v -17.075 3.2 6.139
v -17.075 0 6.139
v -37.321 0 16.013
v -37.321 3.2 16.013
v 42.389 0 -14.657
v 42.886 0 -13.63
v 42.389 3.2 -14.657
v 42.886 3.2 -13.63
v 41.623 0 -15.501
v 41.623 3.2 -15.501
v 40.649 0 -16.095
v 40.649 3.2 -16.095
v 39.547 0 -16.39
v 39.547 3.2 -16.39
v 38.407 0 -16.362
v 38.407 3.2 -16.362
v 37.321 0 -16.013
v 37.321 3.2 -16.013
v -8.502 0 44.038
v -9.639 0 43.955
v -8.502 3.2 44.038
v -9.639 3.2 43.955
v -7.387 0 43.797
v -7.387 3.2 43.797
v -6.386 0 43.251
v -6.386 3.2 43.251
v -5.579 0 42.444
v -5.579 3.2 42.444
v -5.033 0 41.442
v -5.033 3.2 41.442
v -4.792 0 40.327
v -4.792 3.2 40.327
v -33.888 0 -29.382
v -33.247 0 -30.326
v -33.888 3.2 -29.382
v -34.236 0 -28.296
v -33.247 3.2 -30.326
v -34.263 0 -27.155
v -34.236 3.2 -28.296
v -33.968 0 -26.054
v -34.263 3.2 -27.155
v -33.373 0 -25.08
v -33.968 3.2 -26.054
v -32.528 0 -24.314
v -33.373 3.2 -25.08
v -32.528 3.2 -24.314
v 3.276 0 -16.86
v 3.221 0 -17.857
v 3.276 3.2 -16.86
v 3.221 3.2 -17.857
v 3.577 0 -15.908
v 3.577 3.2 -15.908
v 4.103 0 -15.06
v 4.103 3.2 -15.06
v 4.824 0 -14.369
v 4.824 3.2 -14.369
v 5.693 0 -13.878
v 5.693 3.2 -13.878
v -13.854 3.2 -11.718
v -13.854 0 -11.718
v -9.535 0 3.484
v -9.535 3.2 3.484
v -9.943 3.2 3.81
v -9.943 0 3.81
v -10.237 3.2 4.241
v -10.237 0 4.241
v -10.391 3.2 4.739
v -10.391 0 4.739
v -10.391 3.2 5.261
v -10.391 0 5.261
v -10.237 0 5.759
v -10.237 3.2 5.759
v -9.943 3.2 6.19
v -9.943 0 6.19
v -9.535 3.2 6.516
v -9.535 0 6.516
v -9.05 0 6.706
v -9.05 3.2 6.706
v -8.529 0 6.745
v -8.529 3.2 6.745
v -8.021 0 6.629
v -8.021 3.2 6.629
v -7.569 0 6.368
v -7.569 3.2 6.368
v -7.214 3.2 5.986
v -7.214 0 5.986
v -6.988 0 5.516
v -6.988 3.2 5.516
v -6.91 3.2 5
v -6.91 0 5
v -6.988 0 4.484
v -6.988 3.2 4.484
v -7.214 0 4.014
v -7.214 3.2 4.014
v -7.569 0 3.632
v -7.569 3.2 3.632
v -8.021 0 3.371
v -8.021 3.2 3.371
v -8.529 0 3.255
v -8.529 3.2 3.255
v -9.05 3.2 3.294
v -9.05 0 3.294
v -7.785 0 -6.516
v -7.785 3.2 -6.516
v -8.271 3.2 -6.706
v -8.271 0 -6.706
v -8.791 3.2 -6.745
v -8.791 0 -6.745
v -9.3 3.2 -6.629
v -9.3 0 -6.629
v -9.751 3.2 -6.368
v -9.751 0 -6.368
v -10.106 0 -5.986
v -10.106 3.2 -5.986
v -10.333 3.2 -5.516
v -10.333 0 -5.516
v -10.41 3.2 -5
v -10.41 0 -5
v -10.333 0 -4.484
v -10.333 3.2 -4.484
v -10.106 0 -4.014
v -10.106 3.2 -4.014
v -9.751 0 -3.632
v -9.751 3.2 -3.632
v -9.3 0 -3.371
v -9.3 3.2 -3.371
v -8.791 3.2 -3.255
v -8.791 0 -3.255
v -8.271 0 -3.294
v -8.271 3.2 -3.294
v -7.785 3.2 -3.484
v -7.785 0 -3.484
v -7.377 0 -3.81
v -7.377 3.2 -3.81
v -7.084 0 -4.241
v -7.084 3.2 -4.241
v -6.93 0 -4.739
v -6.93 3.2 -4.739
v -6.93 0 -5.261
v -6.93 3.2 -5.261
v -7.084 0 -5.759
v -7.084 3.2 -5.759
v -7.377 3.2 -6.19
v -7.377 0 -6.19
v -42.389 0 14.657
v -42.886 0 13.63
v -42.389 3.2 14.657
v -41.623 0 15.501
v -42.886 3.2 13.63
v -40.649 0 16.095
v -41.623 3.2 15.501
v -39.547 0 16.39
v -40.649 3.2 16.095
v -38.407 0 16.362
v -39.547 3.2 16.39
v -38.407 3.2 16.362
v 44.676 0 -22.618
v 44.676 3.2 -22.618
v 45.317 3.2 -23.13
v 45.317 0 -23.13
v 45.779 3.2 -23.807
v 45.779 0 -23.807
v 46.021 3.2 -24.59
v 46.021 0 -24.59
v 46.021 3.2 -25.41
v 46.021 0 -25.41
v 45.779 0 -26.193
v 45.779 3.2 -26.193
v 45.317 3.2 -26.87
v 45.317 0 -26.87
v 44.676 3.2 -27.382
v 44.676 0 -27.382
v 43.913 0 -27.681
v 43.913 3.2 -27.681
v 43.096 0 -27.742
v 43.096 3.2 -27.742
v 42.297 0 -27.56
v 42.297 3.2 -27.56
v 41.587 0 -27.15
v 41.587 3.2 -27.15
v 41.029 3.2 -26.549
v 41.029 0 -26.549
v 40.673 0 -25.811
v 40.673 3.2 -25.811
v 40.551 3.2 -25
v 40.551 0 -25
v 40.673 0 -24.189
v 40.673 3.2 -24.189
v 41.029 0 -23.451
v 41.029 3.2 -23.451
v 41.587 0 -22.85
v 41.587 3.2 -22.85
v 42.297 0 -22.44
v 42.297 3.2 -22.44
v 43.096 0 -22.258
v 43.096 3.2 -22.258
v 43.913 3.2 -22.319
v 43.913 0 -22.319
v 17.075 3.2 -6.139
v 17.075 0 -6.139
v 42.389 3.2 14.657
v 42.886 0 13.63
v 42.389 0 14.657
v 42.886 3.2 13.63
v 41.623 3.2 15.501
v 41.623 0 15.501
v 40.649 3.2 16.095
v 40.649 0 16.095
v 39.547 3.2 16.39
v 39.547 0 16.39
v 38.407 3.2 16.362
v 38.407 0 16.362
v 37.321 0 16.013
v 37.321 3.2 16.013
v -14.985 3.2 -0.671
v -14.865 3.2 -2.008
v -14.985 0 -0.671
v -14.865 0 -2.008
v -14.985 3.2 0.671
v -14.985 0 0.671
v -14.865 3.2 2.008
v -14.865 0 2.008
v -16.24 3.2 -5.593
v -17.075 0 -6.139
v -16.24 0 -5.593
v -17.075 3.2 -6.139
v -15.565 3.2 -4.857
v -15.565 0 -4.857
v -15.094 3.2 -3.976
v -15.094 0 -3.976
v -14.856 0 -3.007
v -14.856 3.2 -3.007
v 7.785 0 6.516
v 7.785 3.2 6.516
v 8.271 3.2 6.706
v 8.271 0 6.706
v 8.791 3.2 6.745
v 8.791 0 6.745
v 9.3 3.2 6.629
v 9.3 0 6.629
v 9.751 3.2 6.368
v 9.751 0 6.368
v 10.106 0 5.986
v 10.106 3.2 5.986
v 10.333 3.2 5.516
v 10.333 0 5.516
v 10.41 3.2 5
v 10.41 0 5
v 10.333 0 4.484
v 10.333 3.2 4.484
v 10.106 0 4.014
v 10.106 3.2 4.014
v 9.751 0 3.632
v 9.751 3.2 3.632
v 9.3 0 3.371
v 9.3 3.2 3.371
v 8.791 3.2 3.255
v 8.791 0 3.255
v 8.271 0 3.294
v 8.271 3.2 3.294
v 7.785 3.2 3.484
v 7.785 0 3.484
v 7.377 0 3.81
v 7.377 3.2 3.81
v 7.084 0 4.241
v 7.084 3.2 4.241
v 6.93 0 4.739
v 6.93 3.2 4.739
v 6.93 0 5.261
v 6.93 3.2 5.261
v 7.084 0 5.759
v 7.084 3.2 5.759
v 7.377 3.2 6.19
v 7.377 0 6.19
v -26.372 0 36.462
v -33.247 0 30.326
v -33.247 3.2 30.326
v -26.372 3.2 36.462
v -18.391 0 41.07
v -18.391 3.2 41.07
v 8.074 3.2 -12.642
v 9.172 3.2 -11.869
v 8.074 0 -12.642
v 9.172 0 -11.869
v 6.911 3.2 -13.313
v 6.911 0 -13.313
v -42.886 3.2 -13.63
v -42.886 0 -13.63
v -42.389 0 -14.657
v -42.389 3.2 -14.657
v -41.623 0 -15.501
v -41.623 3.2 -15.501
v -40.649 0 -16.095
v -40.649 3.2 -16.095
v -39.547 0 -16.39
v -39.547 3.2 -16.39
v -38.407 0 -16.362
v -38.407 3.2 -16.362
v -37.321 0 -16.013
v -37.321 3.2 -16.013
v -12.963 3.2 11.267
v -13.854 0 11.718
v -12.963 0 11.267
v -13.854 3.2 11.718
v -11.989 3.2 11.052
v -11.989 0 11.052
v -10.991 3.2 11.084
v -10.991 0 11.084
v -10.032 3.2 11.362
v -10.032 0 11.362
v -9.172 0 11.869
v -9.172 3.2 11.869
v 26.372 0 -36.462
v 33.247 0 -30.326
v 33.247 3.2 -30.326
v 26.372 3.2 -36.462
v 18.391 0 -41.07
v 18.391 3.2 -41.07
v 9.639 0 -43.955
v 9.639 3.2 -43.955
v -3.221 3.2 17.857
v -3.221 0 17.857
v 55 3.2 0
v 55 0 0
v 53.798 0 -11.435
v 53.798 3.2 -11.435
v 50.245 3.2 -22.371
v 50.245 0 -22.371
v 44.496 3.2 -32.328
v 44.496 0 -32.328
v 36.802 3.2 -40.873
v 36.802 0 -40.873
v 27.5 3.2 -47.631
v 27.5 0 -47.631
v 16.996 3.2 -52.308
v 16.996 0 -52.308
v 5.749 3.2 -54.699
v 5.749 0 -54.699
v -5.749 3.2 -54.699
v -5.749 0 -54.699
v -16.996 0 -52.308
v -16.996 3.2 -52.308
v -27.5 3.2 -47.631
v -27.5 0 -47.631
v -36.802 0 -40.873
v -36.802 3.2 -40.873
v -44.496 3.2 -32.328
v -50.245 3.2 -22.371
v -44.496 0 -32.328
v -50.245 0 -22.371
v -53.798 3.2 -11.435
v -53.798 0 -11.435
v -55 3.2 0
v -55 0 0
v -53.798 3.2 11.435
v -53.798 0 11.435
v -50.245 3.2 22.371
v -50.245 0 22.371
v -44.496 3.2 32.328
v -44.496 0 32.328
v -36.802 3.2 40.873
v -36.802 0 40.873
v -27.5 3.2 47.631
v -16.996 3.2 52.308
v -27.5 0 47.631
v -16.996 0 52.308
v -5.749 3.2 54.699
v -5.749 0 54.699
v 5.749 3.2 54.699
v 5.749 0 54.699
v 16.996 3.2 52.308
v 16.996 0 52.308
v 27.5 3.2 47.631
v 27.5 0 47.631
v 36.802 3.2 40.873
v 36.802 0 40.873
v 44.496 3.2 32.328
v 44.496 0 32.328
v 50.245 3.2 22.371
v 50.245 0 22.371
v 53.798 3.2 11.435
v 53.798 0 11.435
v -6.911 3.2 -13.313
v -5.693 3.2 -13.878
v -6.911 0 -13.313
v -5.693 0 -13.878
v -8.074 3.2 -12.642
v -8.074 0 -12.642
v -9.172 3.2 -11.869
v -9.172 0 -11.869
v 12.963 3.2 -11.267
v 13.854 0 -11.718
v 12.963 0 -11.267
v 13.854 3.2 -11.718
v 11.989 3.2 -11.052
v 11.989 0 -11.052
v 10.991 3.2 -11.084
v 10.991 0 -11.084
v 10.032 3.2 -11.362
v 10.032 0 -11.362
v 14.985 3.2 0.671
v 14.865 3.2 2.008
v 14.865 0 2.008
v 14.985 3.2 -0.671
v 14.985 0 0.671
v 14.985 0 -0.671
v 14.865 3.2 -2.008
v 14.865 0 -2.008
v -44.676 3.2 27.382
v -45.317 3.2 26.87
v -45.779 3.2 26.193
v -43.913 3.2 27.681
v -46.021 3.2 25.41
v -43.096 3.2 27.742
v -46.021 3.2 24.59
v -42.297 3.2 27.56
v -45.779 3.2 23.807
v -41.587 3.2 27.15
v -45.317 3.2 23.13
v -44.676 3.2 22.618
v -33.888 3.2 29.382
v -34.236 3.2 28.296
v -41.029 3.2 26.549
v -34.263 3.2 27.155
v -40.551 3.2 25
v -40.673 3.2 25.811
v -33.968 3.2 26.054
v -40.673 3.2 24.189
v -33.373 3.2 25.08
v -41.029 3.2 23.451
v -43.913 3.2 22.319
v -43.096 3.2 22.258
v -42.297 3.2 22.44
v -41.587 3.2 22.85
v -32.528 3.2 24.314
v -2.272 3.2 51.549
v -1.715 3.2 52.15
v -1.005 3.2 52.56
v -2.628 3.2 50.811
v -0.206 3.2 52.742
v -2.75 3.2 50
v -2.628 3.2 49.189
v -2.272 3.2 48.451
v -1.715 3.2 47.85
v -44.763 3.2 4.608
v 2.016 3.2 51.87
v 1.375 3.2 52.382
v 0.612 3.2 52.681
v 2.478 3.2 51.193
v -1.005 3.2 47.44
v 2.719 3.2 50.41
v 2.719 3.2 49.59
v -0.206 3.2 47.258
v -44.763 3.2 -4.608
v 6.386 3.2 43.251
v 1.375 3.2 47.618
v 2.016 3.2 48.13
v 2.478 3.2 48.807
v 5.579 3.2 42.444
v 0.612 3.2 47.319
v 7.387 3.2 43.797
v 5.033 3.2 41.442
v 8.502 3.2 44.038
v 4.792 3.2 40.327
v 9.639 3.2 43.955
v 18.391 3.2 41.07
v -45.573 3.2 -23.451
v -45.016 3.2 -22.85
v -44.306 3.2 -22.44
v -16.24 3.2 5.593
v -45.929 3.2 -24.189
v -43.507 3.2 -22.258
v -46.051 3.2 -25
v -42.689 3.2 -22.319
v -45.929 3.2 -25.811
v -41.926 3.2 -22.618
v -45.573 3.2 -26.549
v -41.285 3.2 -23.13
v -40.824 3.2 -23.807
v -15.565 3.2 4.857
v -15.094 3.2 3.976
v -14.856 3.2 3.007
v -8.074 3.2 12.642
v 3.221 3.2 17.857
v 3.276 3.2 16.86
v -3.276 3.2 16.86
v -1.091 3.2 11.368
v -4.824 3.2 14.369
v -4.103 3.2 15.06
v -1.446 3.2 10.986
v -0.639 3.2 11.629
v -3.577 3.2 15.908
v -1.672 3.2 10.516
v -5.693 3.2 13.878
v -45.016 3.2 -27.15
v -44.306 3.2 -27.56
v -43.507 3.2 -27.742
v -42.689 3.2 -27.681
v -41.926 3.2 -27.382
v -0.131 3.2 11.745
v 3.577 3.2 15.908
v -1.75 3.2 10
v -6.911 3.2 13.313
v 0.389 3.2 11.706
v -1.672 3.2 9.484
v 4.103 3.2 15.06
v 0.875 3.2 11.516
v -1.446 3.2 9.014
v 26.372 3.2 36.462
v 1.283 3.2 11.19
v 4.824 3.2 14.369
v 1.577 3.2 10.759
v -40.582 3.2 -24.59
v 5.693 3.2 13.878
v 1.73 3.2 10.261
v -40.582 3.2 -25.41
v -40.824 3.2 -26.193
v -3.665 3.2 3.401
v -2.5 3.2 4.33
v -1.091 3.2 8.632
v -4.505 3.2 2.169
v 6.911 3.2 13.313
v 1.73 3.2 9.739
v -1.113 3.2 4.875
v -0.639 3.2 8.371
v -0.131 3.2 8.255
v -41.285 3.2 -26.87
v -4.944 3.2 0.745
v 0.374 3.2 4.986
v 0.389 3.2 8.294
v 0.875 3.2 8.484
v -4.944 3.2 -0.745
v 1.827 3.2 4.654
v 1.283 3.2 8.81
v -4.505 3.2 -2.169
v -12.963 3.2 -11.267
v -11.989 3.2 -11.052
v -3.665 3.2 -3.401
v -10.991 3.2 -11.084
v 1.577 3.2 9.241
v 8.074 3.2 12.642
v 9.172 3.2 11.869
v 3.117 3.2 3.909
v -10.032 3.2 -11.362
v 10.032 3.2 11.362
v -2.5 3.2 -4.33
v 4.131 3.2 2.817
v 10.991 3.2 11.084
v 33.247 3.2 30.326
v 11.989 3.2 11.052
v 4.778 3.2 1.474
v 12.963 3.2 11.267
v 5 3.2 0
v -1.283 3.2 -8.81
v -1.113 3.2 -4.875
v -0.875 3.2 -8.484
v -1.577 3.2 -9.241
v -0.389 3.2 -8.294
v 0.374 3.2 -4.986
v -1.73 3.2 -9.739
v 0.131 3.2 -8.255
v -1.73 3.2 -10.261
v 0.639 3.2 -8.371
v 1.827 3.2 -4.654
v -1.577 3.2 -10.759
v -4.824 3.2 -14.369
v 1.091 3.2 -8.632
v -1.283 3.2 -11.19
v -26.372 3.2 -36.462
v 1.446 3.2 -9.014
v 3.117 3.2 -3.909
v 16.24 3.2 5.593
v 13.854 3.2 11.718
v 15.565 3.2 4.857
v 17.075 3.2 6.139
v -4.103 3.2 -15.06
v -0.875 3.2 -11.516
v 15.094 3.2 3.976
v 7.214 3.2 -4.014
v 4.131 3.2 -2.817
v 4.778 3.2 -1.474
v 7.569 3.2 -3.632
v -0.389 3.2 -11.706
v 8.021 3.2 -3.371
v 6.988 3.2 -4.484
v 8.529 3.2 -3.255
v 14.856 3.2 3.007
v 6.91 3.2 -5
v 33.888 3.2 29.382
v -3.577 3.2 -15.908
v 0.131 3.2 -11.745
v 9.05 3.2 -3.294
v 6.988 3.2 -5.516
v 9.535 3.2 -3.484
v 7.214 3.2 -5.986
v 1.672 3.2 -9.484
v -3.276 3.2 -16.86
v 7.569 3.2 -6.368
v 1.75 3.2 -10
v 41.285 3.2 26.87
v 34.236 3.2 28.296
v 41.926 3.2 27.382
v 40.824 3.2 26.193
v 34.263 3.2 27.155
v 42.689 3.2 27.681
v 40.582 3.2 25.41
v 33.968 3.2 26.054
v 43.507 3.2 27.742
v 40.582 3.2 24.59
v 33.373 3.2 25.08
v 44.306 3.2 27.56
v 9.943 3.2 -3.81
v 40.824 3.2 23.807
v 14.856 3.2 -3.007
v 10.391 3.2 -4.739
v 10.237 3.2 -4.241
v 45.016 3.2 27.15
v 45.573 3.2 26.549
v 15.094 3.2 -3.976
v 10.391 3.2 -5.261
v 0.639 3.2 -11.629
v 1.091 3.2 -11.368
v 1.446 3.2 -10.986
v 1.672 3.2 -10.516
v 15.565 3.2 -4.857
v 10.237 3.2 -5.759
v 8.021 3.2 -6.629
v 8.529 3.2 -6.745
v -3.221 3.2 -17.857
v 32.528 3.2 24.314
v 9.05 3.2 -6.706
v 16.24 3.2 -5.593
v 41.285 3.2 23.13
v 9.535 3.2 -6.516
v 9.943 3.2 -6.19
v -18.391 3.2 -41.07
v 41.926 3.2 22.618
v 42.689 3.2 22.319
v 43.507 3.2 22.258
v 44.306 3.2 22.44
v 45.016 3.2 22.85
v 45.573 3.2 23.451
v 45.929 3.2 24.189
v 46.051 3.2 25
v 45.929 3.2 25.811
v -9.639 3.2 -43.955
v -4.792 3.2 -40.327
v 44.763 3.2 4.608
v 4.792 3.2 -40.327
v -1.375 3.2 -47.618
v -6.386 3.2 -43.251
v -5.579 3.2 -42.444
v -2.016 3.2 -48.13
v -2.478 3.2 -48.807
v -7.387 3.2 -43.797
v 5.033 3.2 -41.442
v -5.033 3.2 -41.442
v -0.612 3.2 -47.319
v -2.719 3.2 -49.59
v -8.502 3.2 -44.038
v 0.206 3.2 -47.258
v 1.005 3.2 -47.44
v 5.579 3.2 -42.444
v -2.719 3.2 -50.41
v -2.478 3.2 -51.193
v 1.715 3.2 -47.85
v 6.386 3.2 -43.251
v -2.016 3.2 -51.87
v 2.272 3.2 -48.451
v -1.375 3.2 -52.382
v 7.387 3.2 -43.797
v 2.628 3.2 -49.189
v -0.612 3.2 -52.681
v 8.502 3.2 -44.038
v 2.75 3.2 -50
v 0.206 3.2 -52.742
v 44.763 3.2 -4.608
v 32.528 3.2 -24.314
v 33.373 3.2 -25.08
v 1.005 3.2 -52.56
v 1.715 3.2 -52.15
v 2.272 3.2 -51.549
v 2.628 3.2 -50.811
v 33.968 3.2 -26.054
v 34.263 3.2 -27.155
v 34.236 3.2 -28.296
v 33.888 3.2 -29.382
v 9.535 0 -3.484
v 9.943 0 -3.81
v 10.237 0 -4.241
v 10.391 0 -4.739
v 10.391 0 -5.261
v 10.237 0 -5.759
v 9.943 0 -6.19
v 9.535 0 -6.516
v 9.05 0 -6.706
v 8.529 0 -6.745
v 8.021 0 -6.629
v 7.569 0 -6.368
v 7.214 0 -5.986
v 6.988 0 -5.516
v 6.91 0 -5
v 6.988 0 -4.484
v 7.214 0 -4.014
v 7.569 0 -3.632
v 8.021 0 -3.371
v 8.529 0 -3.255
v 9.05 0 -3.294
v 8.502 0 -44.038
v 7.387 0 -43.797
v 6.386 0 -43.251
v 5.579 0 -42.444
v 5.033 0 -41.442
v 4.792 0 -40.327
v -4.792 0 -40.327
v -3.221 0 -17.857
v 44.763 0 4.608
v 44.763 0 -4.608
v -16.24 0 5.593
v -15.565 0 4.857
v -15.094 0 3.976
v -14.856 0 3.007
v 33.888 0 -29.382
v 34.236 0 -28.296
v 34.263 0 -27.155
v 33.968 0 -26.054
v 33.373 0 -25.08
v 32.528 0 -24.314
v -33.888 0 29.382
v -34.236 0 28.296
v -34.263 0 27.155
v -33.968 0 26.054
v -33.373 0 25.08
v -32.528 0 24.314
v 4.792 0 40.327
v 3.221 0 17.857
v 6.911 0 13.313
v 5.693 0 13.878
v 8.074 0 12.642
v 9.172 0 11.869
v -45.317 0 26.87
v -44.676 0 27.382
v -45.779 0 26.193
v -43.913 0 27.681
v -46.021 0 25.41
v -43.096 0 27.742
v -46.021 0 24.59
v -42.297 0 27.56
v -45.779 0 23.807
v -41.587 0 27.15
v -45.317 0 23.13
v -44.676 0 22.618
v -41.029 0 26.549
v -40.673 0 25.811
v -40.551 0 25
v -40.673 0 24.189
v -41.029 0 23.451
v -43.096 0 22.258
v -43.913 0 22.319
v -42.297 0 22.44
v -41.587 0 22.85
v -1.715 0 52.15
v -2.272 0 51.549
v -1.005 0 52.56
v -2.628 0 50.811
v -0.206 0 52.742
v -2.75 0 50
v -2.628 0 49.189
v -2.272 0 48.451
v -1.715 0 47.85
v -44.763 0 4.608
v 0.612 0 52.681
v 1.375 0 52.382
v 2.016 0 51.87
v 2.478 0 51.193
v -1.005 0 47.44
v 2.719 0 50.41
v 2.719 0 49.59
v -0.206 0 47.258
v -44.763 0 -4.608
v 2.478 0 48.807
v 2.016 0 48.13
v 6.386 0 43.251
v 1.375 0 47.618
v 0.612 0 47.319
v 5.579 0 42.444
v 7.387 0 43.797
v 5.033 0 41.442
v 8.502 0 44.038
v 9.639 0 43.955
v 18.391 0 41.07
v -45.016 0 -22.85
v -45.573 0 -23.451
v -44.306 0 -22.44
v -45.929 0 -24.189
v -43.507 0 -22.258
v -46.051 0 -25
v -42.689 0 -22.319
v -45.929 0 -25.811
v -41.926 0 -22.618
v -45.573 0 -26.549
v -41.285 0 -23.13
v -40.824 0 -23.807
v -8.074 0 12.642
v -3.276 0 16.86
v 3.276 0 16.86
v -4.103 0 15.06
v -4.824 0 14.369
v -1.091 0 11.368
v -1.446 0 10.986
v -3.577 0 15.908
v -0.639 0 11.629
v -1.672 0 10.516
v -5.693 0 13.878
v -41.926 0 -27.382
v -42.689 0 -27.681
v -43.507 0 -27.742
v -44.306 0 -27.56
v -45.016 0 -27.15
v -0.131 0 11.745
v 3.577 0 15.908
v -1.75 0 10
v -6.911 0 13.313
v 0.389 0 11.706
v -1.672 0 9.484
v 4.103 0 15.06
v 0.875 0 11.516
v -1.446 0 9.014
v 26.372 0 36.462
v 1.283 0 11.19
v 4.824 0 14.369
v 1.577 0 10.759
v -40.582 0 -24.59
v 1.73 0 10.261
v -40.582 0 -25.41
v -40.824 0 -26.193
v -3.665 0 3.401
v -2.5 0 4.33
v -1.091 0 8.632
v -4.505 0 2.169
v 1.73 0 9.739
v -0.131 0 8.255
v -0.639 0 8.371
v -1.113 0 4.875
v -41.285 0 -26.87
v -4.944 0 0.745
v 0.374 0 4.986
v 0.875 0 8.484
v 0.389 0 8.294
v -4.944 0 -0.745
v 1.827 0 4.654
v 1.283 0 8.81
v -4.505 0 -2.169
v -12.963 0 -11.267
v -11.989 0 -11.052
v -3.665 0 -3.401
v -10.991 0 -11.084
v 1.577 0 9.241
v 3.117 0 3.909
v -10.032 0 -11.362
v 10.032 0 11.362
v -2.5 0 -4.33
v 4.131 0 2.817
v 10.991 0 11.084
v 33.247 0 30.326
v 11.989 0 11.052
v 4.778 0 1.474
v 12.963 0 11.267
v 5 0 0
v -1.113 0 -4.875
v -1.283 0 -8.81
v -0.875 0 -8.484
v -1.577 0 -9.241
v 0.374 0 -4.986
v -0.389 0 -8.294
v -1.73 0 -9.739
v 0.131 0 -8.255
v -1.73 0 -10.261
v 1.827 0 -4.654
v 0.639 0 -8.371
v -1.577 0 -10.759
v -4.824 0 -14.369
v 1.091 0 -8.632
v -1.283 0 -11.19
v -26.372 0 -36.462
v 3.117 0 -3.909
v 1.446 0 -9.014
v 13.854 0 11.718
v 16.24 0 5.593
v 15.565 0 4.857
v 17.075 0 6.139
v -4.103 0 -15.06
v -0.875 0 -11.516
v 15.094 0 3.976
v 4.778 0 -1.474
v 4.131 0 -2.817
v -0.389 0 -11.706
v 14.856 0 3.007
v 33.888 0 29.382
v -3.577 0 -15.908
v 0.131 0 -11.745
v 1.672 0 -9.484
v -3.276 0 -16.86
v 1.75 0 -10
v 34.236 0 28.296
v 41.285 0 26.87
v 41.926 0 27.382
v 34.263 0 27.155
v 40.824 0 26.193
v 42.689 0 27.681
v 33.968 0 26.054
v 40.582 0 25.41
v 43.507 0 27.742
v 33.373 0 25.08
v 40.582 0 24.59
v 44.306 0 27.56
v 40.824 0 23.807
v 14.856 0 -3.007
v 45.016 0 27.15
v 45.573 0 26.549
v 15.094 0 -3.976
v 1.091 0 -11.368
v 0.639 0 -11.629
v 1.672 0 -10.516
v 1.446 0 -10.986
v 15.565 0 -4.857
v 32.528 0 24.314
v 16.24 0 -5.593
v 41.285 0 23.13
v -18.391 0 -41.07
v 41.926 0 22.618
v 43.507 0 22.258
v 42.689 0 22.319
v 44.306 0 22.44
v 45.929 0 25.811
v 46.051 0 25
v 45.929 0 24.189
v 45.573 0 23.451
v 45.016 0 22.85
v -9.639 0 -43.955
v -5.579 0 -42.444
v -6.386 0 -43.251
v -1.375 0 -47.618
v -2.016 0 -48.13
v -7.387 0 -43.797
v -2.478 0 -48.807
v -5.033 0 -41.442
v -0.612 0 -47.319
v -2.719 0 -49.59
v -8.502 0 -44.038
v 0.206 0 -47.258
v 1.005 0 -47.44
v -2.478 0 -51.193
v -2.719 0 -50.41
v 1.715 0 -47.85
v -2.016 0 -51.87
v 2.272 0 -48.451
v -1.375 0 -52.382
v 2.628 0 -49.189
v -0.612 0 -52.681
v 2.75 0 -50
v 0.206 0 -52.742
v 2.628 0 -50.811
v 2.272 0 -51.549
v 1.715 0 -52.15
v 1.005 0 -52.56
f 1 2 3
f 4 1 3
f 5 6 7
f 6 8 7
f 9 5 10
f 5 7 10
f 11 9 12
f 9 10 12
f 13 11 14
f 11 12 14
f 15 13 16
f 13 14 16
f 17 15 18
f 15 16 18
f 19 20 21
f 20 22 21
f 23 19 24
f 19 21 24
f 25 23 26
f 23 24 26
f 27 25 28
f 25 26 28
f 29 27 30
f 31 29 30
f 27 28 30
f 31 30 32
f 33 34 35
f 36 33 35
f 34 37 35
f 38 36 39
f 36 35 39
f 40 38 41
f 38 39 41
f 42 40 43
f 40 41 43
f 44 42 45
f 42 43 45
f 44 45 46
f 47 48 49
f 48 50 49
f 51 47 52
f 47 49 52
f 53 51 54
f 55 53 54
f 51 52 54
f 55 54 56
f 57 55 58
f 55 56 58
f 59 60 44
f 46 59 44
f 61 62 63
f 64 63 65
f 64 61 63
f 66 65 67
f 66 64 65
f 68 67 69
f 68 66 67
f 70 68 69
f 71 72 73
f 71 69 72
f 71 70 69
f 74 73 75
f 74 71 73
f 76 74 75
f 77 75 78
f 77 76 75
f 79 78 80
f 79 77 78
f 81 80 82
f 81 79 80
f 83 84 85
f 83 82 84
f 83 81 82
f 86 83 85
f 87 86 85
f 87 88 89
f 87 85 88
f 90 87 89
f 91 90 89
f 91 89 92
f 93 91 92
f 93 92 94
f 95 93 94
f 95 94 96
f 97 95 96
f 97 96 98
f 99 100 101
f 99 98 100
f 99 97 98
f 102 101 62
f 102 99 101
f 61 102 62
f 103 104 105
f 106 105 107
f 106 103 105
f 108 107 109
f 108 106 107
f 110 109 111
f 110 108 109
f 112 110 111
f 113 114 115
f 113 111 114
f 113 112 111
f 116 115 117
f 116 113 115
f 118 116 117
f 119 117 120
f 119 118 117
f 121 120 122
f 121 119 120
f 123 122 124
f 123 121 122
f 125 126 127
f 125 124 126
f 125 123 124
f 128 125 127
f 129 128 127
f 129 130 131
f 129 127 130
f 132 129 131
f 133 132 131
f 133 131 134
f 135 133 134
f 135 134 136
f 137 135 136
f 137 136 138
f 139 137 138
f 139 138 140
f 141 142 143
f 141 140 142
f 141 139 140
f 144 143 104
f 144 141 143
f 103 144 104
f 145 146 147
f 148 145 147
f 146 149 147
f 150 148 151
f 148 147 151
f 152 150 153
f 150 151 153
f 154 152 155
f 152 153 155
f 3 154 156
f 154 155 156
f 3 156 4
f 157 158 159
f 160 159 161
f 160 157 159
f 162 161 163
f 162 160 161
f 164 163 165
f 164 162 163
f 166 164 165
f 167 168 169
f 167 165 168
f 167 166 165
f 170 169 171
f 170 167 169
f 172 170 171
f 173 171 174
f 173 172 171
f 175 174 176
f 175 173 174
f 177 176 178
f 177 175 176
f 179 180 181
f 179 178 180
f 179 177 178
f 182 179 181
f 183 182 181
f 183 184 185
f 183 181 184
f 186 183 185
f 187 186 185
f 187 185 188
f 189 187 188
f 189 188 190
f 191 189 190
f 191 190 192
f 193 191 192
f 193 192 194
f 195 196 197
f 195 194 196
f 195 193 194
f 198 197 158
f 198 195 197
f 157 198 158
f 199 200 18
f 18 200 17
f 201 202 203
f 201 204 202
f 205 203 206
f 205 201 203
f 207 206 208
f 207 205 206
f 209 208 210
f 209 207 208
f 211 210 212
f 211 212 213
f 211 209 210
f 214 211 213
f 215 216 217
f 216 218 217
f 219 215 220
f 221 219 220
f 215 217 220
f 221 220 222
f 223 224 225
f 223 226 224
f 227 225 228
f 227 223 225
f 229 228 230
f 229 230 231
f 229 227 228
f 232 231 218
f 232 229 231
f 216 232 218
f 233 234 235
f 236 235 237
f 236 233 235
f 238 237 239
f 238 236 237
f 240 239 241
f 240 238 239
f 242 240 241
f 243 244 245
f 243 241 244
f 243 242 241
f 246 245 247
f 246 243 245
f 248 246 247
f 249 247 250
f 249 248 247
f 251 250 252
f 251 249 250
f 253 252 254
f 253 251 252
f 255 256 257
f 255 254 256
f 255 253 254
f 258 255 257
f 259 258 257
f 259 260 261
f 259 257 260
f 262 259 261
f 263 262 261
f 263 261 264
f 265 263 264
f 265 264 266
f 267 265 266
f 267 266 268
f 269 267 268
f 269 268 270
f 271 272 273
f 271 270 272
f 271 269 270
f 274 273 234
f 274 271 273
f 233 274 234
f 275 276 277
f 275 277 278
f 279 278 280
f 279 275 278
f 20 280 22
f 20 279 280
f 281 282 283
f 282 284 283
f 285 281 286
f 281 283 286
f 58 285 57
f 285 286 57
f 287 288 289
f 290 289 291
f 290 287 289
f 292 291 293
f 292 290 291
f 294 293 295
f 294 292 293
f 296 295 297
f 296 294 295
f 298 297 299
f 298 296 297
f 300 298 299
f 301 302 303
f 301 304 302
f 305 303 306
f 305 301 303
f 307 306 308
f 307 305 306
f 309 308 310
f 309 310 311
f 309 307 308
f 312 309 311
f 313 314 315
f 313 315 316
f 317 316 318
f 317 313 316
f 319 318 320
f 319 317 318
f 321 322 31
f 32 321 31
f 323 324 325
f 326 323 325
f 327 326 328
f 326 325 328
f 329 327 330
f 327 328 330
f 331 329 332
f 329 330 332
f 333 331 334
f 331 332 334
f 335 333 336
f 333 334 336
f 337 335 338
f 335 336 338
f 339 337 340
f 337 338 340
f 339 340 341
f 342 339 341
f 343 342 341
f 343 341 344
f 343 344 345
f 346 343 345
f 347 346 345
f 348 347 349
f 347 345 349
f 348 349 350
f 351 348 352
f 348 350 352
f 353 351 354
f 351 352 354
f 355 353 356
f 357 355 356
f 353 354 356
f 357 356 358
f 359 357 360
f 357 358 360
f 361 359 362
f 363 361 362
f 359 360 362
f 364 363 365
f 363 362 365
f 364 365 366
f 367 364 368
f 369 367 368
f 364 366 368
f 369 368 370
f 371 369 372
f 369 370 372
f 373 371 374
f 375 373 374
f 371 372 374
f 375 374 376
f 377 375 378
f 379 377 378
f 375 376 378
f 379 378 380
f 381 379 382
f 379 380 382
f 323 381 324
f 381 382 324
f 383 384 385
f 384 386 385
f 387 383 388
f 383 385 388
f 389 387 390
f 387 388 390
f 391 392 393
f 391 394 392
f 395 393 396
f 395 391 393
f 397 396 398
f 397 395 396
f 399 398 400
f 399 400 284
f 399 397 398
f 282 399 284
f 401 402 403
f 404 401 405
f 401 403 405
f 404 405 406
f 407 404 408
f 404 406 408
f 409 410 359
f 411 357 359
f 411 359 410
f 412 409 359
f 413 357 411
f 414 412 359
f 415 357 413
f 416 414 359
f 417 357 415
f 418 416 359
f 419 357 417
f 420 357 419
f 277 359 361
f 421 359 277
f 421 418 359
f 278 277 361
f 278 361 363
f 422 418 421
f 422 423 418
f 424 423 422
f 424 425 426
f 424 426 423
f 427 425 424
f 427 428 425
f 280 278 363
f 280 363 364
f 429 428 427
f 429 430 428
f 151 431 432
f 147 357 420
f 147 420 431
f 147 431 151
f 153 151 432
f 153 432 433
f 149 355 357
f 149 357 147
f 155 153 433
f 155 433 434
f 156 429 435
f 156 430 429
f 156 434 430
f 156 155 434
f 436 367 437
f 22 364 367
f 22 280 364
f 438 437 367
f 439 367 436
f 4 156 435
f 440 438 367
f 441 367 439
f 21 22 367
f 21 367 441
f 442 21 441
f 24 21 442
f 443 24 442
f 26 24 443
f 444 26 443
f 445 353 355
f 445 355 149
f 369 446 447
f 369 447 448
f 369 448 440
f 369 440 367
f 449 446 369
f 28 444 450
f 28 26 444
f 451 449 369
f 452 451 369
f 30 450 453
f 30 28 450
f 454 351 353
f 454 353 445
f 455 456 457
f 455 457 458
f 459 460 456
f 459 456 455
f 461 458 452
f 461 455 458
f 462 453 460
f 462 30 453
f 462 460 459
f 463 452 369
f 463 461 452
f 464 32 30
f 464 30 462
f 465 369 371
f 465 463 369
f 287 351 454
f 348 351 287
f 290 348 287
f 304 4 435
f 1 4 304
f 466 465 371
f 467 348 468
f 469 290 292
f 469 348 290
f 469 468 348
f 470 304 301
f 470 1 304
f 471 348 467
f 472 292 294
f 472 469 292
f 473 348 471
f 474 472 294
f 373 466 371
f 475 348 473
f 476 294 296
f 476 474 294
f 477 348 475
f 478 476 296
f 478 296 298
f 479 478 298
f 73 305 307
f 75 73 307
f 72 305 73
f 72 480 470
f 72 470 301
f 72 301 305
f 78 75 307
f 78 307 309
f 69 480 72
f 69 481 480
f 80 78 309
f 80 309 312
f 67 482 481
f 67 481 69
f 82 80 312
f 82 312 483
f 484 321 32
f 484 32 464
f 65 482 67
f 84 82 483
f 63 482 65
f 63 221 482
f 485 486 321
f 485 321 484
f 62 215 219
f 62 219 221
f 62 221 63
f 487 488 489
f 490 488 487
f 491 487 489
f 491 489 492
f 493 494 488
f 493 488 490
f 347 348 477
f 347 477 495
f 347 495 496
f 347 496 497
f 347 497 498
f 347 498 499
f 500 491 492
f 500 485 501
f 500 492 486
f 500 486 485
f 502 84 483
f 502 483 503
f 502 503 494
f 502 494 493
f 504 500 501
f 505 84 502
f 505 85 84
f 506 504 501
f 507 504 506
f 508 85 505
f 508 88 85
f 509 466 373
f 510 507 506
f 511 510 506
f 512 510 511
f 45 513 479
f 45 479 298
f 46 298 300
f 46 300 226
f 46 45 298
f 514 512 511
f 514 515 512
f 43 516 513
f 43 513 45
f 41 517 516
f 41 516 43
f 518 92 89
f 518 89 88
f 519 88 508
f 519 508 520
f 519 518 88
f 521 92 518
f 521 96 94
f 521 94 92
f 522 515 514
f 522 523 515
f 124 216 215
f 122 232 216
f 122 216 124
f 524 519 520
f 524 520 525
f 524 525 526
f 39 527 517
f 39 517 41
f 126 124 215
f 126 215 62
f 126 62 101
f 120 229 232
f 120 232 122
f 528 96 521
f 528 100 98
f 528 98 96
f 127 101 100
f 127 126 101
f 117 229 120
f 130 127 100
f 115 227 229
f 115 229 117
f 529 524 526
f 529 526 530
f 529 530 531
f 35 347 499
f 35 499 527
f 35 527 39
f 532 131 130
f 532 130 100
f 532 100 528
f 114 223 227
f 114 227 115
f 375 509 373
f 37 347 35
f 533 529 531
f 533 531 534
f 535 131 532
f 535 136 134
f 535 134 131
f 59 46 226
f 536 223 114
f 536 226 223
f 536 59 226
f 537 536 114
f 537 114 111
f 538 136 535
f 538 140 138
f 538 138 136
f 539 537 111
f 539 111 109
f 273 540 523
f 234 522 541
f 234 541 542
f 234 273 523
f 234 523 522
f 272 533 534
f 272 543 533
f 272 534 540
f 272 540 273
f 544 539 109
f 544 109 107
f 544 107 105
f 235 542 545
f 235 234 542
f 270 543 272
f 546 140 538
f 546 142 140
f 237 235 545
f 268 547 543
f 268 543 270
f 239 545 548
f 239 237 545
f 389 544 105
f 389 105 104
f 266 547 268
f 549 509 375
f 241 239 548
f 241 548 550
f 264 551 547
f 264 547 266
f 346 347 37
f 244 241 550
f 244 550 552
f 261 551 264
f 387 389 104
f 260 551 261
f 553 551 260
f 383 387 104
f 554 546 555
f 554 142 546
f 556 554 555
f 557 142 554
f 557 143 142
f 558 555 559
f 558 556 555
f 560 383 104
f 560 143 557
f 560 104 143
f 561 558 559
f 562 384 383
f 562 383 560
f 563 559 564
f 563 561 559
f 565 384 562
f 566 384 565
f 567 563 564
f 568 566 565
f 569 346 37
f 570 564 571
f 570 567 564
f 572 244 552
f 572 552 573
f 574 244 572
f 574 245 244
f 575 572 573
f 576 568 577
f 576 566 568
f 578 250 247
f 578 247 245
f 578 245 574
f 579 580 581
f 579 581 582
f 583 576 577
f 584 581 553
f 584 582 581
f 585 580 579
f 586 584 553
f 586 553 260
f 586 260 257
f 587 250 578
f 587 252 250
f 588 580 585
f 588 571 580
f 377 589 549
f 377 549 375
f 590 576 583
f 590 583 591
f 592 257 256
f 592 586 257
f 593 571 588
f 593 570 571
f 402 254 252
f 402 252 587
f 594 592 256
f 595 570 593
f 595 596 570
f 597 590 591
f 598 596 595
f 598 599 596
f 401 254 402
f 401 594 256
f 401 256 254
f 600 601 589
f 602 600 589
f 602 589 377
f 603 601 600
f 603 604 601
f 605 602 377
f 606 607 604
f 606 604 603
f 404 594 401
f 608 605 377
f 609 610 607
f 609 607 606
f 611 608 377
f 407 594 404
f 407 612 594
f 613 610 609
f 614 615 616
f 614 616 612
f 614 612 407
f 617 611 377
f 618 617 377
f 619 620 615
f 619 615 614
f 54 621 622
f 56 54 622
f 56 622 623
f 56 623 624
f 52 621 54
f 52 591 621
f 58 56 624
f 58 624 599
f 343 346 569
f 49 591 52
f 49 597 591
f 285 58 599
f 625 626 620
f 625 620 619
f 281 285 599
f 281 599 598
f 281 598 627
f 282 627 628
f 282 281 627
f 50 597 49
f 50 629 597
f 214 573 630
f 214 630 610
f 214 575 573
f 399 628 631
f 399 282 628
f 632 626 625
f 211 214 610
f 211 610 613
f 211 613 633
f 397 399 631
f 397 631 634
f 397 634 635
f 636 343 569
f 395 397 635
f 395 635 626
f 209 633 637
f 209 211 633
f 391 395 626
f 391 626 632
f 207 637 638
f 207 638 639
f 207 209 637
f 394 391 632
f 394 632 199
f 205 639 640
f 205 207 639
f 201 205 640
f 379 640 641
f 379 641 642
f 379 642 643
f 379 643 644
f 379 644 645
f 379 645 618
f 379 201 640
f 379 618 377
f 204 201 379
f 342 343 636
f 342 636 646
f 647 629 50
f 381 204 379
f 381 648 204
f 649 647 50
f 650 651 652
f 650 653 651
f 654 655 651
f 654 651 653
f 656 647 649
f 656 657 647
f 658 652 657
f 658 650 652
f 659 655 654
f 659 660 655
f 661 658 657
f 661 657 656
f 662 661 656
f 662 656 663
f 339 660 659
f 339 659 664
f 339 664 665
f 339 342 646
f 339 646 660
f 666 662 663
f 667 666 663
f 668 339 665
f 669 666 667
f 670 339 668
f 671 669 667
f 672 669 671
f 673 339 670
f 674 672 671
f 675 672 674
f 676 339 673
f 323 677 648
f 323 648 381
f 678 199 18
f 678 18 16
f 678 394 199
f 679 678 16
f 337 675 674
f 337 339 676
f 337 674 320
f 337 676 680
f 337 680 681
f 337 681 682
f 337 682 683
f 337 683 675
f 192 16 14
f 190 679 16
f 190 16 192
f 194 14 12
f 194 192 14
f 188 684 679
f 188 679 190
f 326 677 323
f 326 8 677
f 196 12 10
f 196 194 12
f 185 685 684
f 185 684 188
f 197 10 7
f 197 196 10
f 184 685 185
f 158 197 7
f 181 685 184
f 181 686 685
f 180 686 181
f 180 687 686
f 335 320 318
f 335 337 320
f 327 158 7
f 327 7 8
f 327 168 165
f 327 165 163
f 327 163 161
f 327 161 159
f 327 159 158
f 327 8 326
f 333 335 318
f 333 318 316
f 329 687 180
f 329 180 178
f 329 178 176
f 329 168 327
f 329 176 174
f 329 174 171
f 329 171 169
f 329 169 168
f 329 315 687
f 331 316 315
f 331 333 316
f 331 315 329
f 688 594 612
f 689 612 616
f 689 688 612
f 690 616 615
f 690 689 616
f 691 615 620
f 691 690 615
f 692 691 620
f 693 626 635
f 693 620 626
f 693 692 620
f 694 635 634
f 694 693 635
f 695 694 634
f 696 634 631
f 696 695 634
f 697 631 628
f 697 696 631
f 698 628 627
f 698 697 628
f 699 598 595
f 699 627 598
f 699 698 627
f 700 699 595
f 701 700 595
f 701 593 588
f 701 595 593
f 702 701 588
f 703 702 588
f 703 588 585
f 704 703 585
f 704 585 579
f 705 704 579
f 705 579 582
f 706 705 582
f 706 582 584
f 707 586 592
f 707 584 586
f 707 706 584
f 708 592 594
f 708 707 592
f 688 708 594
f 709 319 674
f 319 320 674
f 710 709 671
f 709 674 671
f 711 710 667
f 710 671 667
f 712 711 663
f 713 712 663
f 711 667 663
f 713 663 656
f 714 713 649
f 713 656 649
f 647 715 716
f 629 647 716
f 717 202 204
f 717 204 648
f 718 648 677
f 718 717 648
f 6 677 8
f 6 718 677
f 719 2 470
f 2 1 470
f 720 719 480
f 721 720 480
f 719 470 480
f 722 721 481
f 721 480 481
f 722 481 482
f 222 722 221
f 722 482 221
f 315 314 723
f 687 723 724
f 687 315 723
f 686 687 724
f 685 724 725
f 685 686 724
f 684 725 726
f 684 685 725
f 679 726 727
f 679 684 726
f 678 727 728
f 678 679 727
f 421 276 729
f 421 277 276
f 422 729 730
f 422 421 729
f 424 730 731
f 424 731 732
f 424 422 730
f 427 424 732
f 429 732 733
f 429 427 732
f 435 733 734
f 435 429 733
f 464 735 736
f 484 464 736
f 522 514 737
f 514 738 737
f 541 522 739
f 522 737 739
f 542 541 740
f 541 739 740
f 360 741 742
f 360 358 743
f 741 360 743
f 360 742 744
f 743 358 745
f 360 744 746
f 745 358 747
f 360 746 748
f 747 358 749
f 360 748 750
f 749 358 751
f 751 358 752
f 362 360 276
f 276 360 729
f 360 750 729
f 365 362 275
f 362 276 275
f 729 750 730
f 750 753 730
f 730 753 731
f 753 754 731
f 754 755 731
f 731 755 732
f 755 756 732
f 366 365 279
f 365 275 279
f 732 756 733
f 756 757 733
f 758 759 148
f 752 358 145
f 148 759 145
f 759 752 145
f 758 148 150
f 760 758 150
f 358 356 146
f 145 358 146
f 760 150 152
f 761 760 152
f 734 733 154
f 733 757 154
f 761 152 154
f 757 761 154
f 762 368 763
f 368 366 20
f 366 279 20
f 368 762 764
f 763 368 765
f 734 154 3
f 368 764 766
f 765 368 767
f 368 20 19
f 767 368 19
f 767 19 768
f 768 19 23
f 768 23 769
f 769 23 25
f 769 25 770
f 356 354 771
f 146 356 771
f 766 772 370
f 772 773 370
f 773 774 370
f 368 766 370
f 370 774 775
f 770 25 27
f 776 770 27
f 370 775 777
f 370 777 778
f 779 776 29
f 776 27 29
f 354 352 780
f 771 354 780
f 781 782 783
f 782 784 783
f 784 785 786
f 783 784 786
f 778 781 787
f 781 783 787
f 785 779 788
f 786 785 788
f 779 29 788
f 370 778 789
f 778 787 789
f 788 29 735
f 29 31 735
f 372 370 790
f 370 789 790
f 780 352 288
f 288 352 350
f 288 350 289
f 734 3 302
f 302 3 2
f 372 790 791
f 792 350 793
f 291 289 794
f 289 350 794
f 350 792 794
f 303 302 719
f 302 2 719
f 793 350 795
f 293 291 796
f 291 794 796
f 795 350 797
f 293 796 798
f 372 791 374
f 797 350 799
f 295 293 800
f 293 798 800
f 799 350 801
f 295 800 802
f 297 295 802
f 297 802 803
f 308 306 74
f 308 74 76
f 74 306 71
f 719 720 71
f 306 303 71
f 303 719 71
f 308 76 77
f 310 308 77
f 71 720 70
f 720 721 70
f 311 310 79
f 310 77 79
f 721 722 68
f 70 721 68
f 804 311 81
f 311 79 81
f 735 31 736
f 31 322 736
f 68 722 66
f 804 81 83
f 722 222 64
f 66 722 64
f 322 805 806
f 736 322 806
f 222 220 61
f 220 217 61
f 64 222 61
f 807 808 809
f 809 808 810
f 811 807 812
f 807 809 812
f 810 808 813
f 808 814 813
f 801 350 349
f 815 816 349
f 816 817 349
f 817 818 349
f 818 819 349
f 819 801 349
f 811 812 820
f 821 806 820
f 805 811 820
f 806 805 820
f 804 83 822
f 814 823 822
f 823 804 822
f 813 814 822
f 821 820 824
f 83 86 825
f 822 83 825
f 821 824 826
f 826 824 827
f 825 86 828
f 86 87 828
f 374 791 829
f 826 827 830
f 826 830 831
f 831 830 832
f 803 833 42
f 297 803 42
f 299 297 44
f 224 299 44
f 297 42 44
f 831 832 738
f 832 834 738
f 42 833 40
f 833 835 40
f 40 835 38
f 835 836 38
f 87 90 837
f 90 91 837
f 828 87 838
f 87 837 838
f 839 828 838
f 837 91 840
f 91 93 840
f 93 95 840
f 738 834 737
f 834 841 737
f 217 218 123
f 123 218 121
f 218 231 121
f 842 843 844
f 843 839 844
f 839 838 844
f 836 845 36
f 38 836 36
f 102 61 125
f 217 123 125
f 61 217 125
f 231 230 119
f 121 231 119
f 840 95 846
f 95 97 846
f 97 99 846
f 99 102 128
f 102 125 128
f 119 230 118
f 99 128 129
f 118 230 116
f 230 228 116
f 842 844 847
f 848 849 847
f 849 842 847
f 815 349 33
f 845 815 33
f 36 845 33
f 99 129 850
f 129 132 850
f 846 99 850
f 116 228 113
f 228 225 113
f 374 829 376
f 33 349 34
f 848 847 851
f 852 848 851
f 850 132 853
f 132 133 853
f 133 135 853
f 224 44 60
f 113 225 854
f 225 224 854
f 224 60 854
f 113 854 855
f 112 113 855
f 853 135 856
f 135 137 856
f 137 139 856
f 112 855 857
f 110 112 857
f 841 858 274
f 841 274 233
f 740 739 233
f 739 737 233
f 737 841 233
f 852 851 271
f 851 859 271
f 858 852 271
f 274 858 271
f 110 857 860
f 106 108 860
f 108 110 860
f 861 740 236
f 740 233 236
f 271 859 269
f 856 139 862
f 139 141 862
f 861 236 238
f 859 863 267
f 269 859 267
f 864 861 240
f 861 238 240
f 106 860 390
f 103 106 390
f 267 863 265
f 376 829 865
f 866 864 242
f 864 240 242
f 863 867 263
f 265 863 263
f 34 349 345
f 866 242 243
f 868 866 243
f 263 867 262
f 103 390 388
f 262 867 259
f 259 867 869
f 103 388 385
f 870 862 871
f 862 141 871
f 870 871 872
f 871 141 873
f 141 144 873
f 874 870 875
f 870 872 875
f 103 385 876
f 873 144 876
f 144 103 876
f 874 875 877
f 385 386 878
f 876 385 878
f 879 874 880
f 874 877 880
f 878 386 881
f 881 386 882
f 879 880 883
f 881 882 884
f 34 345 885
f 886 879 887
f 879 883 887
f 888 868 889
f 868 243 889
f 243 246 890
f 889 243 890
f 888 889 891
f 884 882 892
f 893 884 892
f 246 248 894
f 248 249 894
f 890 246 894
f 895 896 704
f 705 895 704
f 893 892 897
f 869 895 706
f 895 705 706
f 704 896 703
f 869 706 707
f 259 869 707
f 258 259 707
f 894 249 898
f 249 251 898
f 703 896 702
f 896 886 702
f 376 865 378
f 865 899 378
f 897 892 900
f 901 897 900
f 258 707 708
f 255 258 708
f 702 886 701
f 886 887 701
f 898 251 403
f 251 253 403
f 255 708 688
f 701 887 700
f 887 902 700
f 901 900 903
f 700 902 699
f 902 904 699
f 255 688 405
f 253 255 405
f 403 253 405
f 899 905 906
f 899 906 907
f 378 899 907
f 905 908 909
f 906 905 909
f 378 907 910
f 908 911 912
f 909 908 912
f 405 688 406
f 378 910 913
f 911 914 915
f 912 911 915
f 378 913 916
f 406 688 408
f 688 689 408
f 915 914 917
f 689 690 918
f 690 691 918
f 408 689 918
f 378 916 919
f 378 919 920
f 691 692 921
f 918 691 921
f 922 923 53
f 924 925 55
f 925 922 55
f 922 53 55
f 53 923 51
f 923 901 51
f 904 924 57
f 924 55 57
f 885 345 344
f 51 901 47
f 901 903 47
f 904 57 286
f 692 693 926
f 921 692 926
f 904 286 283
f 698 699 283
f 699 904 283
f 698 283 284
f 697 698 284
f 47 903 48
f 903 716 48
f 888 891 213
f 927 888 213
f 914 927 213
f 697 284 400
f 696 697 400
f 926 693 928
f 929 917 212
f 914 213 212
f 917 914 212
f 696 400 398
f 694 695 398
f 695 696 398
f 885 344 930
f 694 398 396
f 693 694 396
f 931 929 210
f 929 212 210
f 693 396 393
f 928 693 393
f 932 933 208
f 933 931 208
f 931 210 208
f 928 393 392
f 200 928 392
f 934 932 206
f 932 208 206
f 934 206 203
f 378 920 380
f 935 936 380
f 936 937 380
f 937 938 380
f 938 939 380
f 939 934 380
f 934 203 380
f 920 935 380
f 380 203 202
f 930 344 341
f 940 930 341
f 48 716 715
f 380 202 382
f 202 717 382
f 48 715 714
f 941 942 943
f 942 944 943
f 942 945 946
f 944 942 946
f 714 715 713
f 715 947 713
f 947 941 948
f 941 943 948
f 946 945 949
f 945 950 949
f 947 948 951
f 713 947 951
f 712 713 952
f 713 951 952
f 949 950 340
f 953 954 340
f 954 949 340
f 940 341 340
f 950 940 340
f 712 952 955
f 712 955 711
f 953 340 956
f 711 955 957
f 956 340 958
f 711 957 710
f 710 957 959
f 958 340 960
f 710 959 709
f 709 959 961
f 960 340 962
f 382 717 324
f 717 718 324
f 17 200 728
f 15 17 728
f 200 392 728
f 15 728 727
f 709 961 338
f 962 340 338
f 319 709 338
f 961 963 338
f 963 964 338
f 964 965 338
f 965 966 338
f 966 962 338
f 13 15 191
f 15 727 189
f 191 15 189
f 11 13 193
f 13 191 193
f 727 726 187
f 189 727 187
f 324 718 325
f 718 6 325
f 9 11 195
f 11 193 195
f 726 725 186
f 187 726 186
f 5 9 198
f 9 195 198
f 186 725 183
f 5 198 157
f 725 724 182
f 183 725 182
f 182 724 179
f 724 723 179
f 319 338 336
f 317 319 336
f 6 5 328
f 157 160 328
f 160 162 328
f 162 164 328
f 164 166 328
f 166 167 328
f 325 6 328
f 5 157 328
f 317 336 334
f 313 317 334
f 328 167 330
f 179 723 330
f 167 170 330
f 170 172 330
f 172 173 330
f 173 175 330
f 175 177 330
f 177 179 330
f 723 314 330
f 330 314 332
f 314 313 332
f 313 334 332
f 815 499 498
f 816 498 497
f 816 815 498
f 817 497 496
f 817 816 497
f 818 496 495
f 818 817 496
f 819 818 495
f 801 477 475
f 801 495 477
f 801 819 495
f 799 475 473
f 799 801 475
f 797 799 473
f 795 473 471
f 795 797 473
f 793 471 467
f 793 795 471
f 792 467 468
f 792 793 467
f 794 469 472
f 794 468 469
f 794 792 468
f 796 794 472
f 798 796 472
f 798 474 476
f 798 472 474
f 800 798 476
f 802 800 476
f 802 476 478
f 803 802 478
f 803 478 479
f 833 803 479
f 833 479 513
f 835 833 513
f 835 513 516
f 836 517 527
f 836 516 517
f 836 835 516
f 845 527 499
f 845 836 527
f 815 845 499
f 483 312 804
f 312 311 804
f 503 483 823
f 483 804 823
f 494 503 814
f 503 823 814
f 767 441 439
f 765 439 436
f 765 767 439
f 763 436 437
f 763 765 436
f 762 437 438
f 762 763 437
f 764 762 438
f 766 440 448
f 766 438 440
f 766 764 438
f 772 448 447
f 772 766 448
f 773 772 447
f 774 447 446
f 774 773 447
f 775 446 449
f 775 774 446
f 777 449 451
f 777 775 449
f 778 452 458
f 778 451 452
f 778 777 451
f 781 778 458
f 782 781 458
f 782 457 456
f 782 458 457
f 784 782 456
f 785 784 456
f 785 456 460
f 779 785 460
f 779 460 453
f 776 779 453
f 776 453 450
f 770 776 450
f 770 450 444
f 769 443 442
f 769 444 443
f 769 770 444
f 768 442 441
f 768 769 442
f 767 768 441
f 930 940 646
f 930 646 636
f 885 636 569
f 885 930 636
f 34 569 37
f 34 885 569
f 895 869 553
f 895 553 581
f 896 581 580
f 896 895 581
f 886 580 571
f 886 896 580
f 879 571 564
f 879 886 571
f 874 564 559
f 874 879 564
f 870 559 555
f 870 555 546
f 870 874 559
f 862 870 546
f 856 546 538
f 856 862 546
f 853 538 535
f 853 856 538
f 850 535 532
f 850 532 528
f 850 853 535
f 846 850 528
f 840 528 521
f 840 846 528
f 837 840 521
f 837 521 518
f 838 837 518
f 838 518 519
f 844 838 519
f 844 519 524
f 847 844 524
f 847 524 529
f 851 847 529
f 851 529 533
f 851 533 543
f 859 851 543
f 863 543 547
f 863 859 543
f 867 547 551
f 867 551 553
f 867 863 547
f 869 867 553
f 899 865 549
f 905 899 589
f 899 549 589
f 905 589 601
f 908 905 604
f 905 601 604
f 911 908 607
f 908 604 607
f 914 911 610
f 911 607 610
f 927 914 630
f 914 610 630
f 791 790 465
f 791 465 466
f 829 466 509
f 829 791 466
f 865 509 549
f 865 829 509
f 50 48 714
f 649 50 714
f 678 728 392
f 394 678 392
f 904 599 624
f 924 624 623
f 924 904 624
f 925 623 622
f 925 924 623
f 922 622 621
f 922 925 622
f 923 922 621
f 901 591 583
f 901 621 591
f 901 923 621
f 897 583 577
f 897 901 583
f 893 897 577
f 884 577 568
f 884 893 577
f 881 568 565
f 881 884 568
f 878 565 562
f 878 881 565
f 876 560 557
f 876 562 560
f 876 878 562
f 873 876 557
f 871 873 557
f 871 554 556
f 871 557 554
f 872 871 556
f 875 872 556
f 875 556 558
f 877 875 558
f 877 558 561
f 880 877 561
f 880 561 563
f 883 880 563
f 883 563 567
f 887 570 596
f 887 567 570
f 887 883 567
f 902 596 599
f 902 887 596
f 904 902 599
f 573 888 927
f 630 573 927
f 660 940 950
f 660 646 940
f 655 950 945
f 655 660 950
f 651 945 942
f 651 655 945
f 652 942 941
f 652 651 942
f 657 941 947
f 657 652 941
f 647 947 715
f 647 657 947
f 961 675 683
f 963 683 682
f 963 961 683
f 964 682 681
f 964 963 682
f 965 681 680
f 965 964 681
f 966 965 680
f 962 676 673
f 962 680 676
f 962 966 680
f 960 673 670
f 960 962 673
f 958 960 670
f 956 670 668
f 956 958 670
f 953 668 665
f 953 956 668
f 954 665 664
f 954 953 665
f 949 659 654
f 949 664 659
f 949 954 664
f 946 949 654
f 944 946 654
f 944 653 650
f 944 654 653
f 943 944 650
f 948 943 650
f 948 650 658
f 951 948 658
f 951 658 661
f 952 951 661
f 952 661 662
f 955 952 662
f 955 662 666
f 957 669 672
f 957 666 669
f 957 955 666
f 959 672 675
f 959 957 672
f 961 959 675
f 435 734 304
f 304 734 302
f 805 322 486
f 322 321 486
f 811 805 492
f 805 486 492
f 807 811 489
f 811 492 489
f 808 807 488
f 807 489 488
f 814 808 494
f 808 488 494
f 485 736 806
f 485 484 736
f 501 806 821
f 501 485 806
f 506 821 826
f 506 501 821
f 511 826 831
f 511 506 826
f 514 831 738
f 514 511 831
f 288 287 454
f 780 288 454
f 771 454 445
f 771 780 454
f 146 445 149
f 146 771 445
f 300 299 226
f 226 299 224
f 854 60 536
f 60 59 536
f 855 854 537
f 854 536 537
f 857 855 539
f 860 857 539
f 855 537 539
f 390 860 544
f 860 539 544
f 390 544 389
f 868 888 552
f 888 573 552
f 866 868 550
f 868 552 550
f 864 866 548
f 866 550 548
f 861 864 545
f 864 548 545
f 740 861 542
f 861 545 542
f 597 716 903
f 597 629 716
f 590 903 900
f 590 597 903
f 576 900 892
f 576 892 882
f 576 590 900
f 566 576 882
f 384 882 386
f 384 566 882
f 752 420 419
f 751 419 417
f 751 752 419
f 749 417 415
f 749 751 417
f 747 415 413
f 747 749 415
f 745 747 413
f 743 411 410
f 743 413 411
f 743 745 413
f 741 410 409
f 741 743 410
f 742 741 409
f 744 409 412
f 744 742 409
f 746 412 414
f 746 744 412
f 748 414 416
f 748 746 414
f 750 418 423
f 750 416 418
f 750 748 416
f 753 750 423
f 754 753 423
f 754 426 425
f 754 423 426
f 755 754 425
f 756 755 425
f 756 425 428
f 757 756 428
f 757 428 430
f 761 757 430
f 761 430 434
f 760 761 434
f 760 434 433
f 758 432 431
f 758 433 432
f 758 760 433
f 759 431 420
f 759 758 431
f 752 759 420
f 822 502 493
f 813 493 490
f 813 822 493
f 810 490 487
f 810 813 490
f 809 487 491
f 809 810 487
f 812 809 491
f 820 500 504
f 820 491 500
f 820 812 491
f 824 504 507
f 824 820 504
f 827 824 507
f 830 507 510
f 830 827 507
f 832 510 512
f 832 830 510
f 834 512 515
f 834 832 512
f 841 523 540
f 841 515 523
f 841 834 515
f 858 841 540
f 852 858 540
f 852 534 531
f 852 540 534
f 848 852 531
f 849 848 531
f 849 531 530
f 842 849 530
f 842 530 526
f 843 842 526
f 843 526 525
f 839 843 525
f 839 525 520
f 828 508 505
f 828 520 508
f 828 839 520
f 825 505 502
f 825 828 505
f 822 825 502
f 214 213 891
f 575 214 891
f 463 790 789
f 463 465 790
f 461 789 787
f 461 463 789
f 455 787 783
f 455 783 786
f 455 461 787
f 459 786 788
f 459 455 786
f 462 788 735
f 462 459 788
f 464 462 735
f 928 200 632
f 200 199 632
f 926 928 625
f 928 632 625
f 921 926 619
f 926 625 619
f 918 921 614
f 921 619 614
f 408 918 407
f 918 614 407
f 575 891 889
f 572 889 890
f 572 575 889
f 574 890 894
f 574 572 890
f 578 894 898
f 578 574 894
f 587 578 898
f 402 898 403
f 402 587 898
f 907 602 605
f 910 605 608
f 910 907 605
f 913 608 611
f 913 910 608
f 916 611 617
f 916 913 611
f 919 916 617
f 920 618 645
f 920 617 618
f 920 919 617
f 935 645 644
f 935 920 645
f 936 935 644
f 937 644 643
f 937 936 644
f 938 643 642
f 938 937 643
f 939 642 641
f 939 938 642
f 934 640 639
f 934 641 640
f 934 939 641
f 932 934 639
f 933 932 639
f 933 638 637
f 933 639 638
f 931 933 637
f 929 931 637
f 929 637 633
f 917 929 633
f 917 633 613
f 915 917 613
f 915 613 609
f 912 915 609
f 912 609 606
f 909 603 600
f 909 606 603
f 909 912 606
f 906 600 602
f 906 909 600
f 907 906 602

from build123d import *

# Parameters (mm, degrees)
SKETCH1_R                = 15
SKETCH1_R_2              = 5
BOSS_EXTRUDE1_DEPTH      = 3.2
SKETCH2_R                = 55
SKETCH2_R_2              = 45
BOSS_EXTRUDE2_DEPTH      = 3.2
BOSS_EXTRUDE3_DEPTH      = 3.2
SKETCH3_R                = 1.75
CUT_EXTRUDE2_DEPTH       = 4.2
SKETCH4_R                = 2.75
CUT_EXTRUDE3_DEPTH       = 4.2
FILLET1_R                = 4
CIRPATTERN1_COUNT        = 6
FILLET1_OF_CIRPATTERN1_R = 4
CIRPATTERN2_COUNT        = 6


with BuildPart() as part:
    # Sketch1 → Boss-Extrude1 (new body)
    with BuildSketch(Plane(origin=(0, 0, 0), x_dir=(1, 0, 0), z_dir=(0, 1, 0))):
        Circle(SKETCH1_R)
        Circle(SKETCH1_R_2, mode=Mode.SUBTRACT)
    extrude(amount=BOSS_EXTRUDE1_DEPTH)



with BuildPart() as body_2:
    # Sketch2 → Boss-Extrude2 (new body)
    with BuildSketch(Plane(origin=(0, 0, 0), x_dir=(1, 0, 0), z_dir=(0, 1, 0))):
        Circle(SKETCH2_R)
        Circle(SKETCH2_R_2, mode=Mode.SUBTRACT)
    extrude(amount=BOSS_EXTRUDE2_DEPTH)


with BuildPart() as part_1:
    add(part.part)

    add(body_2.part)  # Boss-Extrude3 merges body 2
    # Sketch5 → Boss-Extrude3 (add)
    with BuildSketch(Plane(origin=(0, 0, 0), x_dir=(1, 0, 0), z_dir=(0, 1, 0))):
        with BuildLine():
            Line((-5.098732434, 44.710210552), (-3, 14.696938457))
            ThreePointArc((-3, 14.696938457), (0, 15), (3, 14.696938457))
            Line((3, 14.696938457), (5.098732434, 44.710210552))
            ThreePointArc((5.098732434, 44.710210552), (0, 45), (-5.098732434, 44.710210552))
        make_face()
    boss_extrude3 = extrude(amount=BOSS_EXTRUDE3_DEPTH)

    # Sketch3 → Cut-Extrude2 (cut, through all)
    with BuildSketch(Plane(origin=(0, 0, 0), x_dir=(1, 0, 0), z_dir=(0, 1, 0))):
        with Locations((0, 10)):
            Circle(SKETCH3_R)
    cut_extrude2 = extrude(amount=CUT_EXTRUDE2_DEPTH, mode=Mode.SUBTRACT)

    # Sketch4 → Cut-Extrude3 (cut, through all)
    with BuildSketch(Plane(origin=(0, 0, 0), x_dir=(1, 0, 0), z_dir=(0, 1, 0))):
        with Locations((0, 50)):
            Circle(SKETCH4_R)
    cut_extrude3 = extrude(amount=CUT_EXTRUDE3_DEPTH, mode=Mode.SUBTRACT)

    # Fillet1
    fillet1_edges = [part_1.edges().sort_by_distance(p)[0] for p in [
        (5.098732434, 1.6, -44.710210552),
        (-5.098732434, 1.6, -44.710210552),
        (-3, 1.6, -14.696938457),
        (3, 1.6, -14.696938457),
    ]]
    fillet(fillet1_edges, radius=FILLET1_R)

    # CirPattern1: Boss-Extrude3, Cut-Extrude3 ×6 about axis
    cirpattern1_axis = Axis((0, 0, 0), (0, 1, 0))
    for i in range(1, CIRPATTERN1_COUNT):
        add(boss_extrude3.rotate(cirpattern1_axis, i * 360 / CIRPATTERN1_COUNT))
        add(cut_extrude3.rotate(cirpattern1_axis, i * 360 / CIRPATTERN1_COUNT), mode=Mode.SUBTRACT)

    # Fillet1 of CirPattern1
    fillet1_of_cirpattern1_edges = [part_1.edges().sort_by_distance(p)[0] for p in [
        (-36.170811929, 1.6, -26.77073709),
        (-41.269544363, 1.6, -17.939473461),
        (-14.227922061, 1.6, -4.750393017),
        (-11.227922061, 1.6, -9.94654544),
        (-41.269544363, 1.6, 17.939473461),
        (-36.170811929, 1.6, 26.77073709),
        (-11.227922061, 1.6, 9.94654544),
        (-14.227922061, 1.6, 4.750393017),
        (-5.098732434, 1.6, 44.710210552),
        (5.098732434, 1.6, 44.710210552),
        (3, 1.6, 14.696938457),
        (-3, 1.6, 14.696938457),
        (36.170811929, 1.6, 26.77073709),
        (41.269544363, 1.6, 17.939473461),
        (14.227922061, 1.6, 4.750393017),
        (11.227922061, 1.6, 9.94654544),
        (41.269544363, 1.6, -17.939473461),
        (36.170811929, 1.6, -26.77073709),
        (11.227922061, 1.6, -9.94654544),
        (14.227922061, 1.6, -4.750393017),
    ]]
    fillet(fillet1_of_cirpattern1_edges, radius=FILLET1_OF_CIRPATTERN1_R)

    # CirPattern2: Cut-Extrude2 ×6 about axis
    cirpattern2_axis = Axis((0, 0, 0), (0, 1, 0))
    for i in range(1, CIRPATTERN2_COUNT):
        add(cut_extrude2.rotate(cirpattern2_axis, i * 360 / CIRPATTERN2_COUNT), mode=Mode.SUBTRACT)


solid = part_1.part
